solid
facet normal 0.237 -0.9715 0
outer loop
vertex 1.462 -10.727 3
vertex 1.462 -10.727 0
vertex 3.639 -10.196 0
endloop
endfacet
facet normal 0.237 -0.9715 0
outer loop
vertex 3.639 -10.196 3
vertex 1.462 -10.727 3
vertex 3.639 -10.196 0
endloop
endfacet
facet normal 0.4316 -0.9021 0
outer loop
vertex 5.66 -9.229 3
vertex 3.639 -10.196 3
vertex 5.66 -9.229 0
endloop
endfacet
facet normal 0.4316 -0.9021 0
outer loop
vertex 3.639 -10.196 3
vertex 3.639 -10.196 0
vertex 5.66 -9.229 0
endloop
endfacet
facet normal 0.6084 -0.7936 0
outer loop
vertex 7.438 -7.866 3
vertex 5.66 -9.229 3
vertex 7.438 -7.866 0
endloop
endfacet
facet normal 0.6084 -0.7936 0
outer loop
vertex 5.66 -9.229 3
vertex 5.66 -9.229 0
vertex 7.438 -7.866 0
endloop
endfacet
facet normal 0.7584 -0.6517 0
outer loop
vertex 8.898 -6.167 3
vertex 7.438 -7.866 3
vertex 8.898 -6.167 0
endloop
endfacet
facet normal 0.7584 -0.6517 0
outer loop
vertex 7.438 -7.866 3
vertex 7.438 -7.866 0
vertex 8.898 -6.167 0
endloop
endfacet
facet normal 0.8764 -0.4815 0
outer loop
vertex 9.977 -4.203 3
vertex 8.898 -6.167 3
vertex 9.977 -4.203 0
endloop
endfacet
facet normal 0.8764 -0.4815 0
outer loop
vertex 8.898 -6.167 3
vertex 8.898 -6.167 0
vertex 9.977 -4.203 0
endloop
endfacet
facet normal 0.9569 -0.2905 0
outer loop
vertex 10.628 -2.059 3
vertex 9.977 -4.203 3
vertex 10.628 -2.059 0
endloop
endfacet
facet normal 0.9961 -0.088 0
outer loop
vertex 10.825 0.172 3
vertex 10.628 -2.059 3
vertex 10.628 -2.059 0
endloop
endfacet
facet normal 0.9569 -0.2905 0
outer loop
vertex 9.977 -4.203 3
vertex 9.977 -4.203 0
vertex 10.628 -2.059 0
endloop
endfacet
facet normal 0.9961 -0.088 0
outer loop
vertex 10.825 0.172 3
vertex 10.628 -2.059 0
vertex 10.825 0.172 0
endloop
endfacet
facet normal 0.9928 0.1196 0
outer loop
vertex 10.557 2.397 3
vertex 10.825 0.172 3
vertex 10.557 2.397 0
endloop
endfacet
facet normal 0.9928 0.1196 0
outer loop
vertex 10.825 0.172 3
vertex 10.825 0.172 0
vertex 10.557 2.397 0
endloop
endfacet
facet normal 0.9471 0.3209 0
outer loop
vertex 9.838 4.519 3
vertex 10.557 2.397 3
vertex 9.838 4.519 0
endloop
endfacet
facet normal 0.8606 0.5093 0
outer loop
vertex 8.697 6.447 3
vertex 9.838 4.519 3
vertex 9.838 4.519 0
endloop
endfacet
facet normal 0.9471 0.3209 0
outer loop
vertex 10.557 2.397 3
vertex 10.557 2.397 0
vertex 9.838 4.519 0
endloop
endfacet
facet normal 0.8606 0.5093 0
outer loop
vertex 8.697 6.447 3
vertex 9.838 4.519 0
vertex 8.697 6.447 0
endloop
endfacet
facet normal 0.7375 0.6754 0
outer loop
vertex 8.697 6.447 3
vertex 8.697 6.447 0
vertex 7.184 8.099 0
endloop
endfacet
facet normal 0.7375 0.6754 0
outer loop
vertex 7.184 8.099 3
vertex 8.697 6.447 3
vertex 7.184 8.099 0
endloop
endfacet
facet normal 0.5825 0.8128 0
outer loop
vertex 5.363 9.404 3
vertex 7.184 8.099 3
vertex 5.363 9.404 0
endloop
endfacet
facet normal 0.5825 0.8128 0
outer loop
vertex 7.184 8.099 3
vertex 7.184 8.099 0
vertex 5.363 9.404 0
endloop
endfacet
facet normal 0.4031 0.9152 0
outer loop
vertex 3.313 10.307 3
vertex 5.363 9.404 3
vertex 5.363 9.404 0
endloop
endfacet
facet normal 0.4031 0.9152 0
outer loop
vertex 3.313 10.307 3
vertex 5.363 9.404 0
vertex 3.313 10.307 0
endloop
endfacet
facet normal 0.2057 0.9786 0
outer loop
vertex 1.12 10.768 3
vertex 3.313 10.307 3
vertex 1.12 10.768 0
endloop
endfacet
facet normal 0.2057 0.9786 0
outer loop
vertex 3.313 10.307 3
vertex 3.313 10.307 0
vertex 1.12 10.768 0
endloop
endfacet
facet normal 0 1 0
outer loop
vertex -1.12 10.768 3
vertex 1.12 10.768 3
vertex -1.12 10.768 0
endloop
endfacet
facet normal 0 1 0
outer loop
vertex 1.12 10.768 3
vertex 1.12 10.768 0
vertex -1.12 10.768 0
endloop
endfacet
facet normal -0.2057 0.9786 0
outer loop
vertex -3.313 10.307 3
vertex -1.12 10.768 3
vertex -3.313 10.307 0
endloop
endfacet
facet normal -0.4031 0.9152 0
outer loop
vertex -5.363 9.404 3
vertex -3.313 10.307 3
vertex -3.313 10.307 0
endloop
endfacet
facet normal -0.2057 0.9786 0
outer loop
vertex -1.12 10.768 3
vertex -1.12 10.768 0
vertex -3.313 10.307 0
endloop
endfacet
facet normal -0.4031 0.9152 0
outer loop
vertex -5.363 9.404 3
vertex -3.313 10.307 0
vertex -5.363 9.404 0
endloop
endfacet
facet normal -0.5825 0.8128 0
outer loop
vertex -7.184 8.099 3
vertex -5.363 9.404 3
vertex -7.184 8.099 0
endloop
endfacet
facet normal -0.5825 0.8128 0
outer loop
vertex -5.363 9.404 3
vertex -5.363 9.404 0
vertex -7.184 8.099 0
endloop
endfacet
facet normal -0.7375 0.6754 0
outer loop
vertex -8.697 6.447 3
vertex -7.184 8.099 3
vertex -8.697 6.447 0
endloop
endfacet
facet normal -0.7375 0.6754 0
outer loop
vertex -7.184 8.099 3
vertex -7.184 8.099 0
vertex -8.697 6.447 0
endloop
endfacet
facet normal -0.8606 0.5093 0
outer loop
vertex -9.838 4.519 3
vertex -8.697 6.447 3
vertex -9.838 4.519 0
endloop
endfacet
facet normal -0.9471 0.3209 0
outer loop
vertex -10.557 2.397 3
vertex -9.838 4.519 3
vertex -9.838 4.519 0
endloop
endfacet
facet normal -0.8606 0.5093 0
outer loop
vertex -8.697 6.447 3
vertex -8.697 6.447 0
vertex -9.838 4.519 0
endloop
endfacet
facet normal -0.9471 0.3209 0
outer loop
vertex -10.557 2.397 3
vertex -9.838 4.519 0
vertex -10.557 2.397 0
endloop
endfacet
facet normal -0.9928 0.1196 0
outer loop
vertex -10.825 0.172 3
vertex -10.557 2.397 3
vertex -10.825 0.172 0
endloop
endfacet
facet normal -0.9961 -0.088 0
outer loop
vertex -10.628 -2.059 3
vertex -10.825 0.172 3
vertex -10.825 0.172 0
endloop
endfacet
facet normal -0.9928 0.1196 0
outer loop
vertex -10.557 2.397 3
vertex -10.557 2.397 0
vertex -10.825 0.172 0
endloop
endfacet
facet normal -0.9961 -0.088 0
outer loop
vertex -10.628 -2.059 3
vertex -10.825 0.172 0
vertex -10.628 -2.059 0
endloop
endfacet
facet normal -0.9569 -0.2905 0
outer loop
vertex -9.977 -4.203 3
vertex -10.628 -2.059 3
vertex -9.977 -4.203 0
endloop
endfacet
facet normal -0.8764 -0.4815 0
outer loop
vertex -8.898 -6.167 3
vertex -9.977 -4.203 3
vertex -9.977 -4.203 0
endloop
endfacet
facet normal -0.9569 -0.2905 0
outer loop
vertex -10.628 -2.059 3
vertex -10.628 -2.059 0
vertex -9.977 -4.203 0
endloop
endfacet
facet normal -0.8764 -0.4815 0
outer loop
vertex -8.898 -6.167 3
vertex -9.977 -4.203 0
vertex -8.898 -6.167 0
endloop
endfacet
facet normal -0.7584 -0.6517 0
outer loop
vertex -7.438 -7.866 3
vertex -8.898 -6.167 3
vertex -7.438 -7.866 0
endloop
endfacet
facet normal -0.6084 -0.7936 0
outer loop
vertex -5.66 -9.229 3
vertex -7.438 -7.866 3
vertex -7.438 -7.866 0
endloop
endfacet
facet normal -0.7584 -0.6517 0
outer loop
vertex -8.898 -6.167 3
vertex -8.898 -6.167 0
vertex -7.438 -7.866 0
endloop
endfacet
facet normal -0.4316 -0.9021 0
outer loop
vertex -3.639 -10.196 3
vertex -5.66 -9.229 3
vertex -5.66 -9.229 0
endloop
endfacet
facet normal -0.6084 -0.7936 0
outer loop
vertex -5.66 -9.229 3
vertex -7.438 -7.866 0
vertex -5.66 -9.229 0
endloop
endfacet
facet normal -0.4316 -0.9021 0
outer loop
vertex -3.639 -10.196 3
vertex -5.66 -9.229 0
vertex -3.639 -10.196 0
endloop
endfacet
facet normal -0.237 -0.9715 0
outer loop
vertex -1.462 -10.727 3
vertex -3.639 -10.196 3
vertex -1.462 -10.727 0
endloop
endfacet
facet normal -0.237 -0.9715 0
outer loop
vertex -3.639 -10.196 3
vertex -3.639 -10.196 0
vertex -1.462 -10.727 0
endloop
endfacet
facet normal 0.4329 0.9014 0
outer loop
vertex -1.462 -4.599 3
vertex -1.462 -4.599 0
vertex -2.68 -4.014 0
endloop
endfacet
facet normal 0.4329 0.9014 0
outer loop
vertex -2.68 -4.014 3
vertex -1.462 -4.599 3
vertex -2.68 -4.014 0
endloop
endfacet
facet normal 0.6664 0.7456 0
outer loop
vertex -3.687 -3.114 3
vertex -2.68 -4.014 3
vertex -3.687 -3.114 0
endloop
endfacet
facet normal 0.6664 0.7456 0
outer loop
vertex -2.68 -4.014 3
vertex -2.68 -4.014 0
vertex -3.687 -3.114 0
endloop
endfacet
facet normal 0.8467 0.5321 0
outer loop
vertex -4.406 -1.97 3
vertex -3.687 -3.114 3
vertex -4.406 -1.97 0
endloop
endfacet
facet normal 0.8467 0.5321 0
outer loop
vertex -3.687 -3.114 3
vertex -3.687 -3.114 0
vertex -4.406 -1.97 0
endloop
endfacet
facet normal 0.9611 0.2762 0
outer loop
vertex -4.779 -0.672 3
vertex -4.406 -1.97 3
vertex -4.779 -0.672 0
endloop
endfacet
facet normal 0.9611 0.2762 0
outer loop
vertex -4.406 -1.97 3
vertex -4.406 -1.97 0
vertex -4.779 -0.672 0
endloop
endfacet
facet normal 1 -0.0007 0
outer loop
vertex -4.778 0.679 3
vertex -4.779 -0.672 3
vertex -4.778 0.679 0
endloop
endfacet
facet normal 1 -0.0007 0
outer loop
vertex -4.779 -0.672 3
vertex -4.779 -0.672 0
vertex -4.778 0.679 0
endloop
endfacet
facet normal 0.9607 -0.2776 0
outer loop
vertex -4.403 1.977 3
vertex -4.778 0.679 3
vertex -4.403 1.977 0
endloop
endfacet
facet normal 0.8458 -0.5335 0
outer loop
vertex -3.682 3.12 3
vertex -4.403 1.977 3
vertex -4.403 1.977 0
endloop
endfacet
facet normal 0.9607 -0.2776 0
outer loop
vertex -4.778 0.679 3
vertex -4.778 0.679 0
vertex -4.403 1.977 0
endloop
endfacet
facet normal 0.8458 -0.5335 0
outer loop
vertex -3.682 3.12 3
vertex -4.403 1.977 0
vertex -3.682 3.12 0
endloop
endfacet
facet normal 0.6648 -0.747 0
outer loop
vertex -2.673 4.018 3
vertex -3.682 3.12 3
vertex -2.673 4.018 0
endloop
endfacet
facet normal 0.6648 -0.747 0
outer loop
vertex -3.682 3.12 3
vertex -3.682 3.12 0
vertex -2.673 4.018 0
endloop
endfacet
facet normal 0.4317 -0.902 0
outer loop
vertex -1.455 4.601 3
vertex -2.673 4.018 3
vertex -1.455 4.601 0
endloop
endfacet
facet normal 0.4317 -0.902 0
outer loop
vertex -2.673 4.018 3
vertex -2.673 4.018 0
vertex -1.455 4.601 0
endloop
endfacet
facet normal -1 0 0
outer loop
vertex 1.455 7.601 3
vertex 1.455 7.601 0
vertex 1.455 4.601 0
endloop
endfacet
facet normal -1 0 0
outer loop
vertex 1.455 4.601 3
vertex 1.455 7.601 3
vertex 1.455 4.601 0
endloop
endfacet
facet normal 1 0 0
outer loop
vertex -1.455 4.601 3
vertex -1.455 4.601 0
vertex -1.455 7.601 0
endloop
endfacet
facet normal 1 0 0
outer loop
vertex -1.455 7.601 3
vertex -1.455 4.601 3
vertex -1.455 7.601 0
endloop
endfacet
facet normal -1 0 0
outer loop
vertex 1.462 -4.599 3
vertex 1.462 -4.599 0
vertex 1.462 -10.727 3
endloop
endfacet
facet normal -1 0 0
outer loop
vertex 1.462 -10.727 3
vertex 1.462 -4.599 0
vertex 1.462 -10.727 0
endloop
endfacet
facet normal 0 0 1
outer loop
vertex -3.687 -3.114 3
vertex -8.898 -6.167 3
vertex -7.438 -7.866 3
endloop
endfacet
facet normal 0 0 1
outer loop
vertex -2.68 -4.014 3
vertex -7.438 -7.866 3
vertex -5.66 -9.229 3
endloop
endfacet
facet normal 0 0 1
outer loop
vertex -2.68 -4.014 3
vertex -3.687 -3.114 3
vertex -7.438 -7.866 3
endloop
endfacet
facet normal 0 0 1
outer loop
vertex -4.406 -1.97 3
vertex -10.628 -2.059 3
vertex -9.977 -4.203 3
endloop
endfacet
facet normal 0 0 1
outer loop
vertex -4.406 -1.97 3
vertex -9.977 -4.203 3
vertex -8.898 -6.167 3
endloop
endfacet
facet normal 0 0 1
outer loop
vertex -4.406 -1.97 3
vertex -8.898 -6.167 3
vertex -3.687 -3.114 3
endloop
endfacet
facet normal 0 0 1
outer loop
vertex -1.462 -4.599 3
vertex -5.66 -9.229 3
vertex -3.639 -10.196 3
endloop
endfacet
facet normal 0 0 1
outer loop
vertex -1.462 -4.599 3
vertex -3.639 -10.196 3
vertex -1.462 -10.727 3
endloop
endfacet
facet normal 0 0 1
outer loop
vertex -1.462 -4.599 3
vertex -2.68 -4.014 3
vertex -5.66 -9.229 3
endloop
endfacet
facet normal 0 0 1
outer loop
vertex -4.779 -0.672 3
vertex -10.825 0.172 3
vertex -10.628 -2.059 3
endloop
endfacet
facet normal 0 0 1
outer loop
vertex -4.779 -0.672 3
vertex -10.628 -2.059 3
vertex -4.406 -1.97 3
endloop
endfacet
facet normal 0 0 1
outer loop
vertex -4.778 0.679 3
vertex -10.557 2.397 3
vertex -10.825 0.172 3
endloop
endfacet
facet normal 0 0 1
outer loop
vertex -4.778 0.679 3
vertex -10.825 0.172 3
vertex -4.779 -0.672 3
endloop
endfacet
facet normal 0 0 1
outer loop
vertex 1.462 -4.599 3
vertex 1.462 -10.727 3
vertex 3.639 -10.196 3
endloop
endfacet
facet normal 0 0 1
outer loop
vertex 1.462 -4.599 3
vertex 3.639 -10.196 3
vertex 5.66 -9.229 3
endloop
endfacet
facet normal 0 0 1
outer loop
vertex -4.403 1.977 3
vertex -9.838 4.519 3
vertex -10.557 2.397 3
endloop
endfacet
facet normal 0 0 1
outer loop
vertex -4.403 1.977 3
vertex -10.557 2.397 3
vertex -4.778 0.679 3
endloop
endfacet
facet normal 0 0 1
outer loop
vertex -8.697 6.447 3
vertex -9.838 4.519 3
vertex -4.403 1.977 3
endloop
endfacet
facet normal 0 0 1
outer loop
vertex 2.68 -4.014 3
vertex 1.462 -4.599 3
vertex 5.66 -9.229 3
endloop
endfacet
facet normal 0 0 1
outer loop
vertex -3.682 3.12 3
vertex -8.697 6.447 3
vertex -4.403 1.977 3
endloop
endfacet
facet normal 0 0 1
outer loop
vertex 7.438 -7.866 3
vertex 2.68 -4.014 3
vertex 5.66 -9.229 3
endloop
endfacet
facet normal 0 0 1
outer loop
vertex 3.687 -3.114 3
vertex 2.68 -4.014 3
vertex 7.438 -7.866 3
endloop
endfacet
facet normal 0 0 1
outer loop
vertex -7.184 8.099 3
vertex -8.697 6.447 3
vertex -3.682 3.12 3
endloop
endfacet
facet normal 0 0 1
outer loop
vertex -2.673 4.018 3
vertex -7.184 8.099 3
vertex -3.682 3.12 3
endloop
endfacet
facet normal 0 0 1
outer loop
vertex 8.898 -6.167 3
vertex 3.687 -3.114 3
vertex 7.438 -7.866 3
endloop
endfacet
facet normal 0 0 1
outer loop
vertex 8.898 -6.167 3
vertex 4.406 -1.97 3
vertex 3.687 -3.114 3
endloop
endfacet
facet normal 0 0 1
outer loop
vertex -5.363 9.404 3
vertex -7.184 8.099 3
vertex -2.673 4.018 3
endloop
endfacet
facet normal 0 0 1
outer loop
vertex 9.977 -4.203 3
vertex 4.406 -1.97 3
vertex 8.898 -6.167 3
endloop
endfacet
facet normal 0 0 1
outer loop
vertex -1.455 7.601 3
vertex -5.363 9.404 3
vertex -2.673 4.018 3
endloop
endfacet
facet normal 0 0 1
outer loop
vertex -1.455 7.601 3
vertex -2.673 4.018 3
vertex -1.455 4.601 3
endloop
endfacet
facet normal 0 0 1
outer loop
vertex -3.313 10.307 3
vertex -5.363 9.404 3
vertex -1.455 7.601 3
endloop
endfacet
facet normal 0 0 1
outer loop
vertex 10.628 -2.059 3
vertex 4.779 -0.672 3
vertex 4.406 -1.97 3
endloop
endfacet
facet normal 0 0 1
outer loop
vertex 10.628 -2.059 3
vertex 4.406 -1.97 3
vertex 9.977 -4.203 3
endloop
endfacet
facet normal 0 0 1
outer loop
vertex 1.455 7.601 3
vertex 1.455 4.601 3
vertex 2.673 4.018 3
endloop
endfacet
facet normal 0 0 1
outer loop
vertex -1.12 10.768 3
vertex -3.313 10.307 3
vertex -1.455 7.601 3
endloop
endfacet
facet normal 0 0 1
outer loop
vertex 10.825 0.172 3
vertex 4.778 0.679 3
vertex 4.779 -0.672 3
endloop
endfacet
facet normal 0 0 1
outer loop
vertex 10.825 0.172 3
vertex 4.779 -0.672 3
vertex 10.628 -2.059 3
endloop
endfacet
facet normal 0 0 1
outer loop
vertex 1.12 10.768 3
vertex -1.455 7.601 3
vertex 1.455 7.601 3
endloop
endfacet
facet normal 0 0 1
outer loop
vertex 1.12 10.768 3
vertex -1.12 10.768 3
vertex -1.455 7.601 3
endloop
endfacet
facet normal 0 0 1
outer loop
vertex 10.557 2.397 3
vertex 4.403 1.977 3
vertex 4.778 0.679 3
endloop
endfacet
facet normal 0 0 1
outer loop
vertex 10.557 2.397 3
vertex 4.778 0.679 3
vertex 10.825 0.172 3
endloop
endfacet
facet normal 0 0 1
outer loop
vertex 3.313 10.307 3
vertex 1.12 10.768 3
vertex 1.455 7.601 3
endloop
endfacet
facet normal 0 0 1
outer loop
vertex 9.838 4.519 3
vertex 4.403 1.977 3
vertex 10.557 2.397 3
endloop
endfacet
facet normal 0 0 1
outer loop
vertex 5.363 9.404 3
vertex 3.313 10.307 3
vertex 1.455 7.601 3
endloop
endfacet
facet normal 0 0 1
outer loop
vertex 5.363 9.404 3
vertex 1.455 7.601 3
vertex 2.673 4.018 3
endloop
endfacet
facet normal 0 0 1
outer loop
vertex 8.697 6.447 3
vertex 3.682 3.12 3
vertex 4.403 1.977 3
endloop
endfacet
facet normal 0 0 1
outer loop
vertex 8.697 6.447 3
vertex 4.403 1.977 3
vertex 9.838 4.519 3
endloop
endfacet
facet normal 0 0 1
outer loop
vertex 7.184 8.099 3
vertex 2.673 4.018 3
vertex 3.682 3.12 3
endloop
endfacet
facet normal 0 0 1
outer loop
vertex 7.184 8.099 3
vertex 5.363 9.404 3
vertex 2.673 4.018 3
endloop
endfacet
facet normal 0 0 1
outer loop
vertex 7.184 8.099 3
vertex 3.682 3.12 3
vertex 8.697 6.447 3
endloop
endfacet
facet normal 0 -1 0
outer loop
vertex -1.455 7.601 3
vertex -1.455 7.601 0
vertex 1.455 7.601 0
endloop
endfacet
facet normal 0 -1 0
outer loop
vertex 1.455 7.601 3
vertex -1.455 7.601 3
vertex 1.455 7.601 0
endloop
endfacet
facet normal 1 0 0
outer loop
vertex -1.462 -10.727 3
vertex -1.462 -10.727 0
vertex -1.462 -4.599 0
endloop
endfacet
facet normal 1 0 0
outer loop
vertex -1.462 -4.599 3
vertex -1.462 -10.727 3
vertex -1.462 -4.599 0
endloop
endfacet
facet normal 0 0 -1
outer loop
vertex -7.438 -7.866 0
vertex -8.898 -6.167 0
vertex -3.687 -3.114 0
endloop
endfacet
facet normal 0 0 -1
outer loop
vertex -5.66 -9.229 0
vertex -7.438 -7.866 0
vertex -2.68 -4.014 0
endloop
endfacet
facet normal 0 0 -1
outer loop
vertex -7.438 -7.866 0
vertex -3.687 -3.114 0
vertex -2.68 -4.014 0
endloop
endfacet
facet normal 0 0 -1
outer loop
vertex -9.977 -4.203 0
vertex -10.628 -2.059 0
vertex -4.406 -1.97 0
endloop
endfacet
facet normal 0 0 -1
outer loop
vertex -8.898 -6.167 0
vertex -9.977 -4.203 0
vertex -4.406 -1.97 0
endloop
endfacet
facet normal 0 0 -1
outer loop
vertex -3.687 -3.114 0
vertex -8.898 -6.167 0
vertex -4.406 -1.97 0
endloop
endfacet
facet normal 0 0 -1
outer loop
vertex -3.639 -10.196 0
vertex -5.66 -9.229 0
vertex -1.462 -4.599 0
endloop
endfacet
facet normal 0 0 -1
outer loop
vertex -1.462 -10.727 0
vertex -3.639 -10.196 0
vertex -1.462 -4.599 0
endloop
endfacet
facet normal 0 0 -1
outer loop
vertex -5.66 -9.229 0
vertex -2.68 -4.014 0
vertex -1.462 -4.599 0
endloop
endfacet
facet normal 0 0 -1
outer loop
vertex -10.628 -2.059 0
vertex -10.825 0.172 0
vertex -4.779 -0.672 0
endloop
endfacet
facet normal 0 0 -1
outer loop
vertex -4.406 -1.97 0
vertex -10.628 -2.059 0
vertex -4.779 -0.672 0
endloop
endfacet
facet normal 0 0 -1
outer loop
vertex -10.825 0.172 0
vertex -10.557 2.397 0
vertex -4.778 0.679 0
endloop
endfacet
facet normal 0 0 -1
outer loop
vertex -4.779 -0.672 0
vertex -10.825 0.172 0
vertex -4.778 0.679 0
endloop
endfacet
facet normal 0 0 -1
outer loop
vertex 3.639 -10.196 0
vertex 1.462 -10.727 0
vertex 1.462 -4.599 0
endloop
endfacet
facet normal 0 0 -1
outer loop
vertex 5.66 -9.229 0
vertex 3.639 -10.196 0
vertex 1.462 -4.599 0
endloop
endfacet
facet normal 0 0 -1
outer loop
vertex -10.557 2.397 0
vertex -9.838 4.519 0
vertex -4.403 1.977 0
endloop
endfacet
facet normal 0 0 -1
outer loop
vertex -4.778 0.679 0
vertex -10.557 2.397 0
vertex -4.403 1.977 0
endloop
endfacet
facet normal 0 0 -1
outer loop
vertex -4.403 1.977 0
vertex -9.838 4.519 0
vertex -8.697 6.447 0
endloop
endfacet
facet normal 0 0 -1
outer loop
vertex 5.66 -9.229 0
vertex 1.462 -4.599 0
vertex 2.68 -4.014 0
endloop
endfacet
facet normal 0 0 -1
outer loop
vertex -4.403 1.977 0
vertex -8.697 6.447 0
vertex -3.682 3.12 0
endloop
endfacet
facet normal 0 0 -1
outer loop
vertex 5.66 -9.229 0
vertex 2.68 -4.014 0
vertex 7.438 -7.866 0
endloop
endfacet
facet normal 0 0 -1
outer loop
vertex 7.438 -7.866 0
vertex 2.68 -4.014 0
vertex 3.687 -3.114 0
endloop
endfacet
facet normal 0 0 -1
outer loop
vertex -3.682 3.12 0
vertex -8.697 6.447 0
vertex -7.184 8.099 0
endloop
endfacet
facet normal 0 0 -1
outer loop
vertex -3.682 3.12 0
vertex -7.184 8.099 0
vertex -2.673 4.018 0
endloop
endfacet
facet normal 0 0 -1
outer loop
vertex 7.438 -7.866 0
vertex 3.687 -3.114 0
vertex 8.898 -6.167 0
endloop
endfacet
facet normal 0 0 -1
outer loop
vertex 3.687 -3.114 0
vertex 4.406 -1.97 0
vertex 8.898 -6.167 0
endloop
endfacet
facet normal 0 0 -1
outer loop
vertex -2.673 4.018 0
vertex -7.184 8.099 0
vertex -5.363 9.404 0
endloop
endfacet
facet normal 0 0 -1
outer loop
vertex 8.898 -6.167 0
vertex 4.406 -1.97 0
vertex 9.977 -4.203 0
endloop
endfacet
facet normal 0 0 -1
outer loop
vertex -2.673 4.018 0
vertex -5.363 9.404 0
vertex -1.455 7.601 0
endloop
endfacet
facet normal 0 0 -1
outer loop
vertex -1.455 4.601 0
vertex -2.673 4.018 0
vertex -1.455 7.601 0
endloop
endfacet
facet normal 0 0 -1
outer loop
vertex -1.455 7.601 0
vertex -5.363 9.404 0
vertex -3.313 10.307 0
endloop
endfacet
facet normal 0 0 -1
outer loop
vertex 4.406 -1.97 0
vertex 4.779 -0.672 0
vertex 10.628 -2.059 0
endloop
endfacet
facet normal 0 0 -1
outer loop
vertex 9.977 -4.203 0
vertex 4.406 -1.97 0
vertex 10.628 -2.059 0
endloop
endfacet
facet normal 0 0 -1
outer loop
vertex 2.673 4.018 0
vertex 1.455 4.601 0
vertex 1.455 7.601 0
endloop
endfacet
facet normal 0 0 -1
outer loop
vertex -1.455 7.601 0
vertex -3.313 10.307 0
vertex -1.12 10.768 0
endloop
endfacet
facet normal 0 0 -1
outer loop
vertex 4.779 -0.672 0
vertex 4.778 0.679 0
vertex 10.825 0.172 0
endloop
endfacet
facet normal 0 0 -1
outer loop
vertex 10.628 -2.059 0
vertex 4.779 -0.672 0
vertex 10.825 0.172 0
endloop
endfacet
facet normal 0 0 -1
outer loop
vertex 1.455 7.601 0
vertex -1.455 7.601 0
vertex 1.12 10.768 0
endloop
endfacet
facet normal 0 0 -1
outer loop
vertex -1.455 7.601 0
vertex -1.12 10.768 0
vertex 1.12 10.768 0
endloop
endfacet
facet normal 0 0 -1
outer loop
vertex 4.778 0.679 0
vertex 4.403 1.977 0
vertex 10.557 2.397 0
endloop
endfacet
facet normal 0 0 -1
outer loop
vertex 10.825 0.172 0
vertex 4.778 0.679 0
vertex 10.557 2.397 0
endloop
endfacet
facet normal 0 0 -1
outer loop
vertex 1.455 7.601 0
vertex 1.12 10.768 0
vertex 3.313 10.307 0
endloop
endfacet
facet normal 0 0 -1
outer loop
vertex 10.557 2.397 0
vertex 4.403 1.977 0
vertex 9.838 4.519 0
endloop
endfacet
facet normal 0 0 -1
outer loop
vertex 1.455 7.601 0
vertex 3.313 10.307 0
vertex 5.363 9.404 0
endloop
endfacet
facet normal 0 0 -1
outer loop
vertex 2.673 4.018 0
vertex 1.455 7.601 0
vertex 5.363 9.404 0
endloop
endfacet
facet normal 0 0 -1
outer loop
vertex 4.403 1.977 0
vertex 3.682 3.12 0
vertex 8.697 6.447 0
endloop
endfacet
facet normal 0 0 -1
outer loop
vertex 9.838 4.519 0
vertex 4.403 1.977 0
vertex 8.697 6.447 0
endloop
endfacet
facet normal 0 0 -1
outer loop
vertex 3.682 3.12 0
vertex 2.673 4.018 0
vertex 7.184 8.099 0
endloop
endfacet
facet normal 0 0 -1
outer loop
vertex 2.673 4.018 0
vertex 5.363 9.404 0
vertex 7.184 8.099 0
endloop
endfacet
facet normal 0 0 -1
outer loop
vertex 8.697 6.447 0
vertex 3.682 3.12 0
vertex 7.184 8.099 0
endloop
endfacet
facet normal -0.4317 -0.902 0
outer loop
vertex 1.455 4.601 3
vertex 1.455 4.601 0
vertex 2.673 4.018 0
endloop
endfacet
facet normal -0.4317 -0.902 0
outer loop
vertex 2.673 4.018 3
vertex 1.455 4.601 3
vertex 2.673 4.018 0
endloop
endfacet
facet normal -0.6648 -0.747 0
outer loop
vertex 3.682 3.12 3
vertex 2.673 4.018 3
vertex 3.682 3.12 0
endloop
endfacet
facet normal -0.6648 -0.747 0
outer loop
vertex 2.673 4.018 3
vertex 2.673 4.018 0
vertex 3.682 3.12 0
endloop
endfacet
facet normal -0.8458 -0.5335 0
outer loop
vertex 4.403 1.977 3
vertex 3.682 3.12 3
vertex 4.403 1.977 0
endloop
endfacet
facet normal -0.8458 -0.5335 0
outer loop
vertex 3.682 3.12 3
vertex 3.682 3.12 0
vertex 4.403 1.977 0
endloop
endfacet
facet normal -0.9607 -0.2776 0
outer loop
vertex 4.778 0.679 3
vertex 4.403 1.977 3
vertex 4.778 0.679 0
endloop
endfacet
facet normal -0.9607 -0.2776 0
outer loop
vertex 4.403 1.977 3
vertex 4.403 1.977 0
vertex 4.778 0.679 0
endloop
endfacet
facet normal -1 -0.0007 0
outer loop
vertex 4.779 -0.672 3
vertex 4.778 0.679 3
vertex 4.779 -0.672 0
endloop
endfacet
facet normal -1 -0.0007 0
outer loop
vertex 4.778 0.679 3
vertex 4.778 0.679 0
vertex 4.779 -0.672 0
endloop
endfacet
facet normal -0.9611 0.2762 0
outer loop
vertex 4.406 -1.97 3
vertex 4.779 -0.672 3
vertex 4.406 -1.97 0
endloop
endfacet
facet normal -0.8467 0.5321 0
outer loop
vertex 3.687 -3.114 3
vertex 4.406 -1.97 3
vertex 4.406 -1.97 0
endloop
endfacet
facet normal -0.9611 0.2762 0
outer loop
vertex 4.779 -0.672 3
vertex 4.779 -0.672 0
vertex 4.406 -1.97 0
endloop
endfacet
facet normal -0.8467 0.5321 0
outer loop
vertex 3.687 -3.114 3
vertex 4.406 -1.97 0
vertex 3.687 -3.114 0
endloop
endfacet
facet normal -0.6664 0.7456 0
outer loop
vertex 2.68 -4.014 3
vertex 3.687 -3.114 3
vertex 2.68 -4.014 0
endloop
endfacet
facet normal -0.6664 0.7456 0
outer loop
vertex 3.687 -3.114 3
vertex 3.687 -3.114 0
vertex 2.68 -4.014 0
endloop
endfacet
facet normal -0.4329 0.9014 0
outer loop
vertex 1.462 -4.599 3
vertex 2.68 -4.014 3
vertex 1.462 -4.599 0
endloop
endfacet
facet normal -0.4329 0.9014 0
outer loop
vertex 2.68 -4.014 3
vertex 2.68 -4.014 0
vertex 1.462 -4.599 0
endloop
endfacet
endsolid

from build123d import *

# Parameters (mm, degrees)
EXTRUDE_1_DEPTH = 3


with BuildPart() as part:
    # 스케치1 → 보스-돌출1 (new body)
    with BuildSketch(Plane.XY):
        with BuildLine():
            Line((-1.455, 7.601440101), (1.455, 7.601440101))
            Line((1.455, 7.601440101), (1.455, 4.601440101))
            ThreePointArc((1.455, 4.601440101), (4.825998397, 0.003934023), (1.4625, -4.599061834))
            Line((1.4625, -4.599061834), (1.4625, -10.726759518))
            ThreePointArc((1.4625, -10.726759518), (0, 10.826), (-1.4625, -10.726759518))
            Line((-1.4625, -10.726759518), (-1.4625, -4.599061834))
            ThreePointArc((-1.4625, -4.599061834), (-4.825998397, 0.003934023), (-1.455, 4.601440101))
            Line((-1.455, 4.601440101), (-1.455, 7.601440101))
        make_face()
    extrude(amount=EXTRUDE_1_DEPTH)


solid = part.part
